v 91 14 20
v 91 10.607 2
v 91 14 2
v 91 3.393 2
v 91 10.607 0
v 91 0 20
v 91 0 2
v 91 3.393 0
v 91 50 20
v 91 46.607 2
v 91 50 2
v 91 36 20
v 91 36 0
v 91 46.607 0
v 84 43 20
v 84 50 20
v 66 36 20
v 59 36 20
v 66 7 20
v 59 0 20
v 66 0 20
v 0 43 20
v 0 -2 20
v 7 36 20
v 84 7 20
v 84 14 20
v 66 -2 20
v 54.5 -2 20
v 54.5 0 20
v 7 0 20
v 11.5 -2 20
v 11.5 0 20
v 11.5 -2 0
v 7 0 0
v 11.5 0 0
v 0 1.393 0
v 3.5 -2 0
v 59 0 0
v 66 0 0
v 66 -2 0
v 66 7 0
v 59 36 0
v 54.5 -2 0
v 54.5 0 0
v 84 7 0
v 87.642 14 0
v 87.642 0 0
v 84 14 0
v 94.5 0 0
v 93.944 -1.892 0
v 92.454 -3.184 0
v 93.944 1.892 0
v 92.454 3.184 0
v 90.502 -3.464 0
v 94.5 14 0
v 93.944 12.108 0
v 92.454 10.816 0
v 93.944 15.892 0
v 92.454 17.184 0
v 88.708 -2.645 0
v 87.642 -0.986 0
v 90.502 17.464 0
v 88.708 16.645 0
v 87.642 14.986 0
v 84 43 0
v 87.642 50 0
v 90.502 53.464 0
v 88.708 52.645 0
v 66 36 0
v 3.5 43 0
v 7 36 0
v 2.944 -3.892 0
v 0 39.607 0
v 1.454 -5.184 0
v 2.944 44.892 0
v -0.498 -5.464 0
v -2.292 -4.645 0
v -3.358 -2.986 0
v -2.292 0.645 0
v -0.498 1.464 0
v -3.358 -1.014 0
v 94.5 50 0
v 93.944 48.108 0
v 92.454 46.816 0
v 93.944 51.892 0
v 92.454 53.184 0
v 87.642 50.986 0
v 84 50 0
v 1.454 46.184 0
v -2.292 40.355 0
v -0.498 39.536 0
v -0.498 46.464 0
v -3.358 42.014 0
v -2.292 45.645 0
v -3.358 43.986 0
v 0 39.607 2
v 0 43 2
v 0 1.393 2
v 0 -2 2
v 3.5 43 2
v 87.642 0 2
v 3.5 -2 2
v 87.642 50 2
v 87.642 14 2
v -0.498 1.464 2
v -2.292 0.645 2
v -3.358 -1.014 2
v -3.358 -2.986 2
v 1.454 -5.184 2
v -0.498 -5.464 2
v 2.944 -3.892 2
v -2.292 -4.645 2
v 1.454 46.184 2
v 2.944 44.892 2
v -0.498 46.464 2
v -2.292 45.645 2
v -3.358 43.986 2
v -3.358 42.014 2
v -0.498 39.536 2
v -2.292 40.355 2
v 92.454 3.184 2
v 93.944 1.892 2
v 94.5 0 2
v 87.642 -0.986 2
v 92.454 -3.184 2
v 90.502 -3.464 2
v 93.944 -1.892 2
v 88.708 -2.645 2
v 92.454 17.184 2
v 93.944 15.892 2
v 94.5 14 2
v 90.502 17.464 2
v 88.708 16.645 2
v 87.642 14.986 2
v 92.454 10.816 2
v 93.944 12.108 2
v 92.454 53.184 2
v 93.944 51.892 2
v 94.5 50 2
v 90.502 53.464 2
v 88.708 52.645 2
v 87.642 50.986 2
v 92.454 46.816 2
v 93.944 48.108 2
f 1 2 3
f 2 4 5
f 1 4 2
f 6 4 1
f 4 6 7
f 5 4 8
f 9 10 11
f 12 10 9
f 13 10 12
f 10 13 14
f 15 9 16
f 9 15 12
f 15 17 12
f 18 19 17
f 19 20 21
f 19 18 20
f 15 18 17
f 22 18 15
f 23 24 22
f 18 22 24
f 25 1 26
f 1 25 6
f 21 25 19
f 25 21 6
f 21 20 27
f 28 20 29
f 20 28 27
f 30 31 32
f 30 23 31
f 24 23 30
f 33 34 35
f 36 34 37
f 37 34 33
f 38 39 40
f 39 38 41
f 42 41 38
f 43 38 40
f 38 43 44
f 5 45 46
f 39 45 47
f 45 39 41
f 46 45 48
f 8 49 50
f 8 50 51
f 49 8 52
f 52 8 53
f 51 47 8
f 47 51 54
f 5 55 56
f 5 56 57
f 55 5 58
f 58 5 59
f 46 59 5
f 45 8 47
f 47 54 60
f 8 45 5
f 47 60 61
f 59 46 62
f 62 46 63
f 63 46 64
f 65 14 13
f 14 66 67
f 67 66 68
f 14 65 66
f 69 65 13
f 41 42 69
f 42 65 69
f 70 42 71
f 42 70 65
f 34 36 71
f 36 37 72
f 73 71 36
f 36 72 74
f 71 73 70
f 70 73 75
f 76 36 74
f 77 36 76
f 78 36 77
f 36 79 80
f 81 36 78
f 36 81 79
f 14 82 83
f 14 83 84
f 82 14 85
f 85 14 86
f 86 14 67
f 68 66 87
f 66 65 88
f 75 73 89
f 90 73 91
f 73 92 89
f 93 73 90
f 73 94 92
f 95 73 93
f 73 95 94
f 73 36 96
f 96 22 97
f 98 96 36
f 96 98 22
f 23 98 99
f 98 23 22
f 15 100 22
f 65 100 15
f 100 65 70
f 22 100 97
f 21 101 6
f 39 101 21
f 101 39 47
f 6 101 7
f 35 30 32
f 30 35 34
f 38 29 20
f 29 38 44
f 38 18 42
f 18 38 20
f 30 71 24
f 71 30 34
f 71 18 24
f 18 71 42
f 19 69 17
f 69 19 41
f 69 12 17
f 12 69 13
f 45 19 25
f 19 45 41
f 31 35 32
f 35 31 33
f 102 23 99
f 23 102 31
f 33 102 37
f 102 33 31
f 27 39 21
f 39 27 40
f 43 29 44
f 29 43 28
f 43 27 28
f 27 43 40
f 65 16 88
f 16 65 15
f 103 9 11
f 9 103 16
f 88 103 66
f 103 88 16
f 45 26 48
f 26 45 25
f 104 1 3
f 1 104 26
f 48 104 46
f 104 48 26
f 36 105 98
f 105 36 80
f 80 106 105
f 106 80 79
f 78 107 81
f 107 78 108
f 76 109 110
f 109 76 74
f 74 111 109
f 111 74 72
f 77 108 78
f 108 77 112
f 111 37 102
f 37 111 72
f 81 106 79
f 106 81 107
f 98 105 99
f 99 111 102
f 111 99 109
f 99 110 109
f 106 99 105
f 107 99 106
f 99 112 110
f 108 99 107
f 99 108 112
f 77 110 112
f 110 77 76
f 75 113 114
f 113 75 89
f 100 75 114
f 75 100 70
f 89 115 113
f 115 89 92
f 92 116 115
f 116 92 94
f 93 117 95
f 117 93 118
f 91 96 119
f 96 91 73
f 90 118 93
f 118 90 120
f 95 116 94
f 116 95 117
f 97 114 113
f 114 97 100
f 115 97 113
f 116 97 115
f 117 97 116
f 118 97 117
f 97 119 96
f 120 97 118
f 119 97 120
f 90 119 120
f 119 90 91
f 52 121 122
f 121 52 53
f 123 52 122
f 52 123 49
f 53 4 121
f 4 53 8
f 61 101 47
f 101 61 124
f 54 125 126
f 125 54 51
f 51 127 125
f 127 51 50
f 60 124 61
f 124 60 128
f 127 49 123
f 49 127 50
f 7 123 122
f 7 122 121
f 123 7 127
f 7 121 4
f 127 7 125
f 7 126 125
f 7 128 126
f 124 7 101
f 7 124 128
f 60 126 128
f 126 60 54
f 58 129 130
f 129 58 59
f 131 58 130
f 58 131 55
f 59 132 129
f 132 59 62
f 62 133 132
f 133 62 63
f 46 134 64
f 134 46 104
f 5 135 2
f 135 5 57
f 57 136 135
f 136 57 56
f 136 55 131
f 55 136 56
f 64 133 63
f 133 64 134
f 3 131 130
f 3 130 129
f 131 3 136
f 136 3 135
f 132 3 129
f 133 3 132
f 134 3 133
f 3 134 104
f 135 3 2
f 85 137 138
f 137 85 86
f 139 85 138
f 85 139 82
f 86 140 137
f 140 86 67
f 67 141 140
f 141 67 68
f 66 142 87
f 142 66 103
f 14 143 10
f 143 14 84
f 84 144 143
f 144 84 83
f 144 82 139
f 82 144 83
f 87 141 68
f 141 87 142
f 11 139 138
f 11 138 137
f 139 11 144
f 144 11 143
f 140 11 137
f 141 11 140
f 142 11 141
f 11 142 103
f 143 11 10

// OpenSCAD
//
//  CubicalCoatHanger2
//
//  EvilTeach
//
//  1/15/2015
//
//  This is a replacment of the previous version
//  which is just fine in most cases.  When I added
//  my wintercoat to the mix of hat and jacket, it collapsed.
//  This model is a bit thicker and wider, and printed denser
//  so as to have a longer life.
//

//
//  55 minutes
//  5.8 meters
//  infill 15%
//  .2 layer
//  no shells
//  speed 60/75

// (RED) In effect this is the width of the piece.  For a lighter load this value can be reduced.
modelHeight    = 20.0;

// (RED) This is the thickness of the beam like parts.  With a lighter load this value can be reduced.
modelThickness =  7.0;

// (BLUE) distance across the metal cap on top of the cube partition
capWidth = 52.0;

// (BLUE) the height of the metal cap.
capDepth = 36.0;

// (RED) This is how far out the hook reaches from the cap
hookWidth = 25.0;

// (YELLOW) This is the size of the cube that the coat hooks on to.
hookDepth = modelThickness;

modelDepth = capDepth + modelThickness;
modelWidth = modelThickness + capWidth + modelThickness + hookWidth;

// (LIME) The length of the feet that grip under the cap
footDepth = 2.0;

// (CYAN) dimensions of the mouse ears
mouseEarRadius = 3.5;
mouseEarHeight = 2.0;

module mouse_ear()
{
    cylinder(r = mouseEarRadius, h = mouseEarHeight);
}



module cap()
{
    color("blue")
    {
        translate([modelThickness, 0, 0])
        cube([capWidth, capDepth, modelHeight]);
    }
}



module hook_arm()
{
    hookDepth = capDepth - modelThickness;
    translate([modelThickness + capWidth + modelThickness, modelThickness, 0])
        cube([hookWidth, hookDepth, modelHeight]);
}



module hooks()
{
    color("yellow")
    {
        translate([modelThickness + capWidth + modelThickness + hookWidth - modelThickness, 
                   capDepth + modelThickness, 
                   0])
            cube([modelThickness, modelThickness, modelHeight]);
        
        translate([modelThickness + capWidth + modelThickness + hookWidth - modelThickness, 
                   modelThickness, 
                   0])
            cube([modelThickness, hookDepth, modelHeight]);
    }
}

module base_cube()
{
    color("red")
        cube([modelWidth, modelDepth, modelHeight]);
}



module feet()
{
    color("lime")
    {
        footWidth = modelThickness + 4.5;
        footHeight = modelHeight;
        
        translate([0, -footDepth, 0])
            cube([footWidth, footDepth, footHeight]);

        translate([modelThickness + capWidth + modelThickness - footWidth, -footDepth, 0])
            cube([footWidth, footDepth, footHeight]);
    }
}



module mouse_ears()
{
    color("cyan")
    translate([0, -footDepth, 0])
        mouse_ear();

    color("cyan")
    translate([0, capDepth + modelThickness, 0])
        mouse_ear();
    
    color("cyan")
    translate([modelThickness + capWidth + modelThickness + hookWidth, 0, 0])
        mouse_ear();    

    color("cyan")
    translate([modelThickness + capWidth + modelThickness + hookWidth, modelThickness + hookDepth, 0])
        mouse_ear();

    color("cyan")
    translate([modelThickness + capWidth + modelThickness + hookWidth, capDepth + modelThickness + hookDepth, 0])
        mouse_ear();    

    
}



module main()
{
    difference()
    {
        base_cube();
        cap();
        hook_arm();
    }
    feet();
    hooks();
    
    mouse_ears();
}

main();
